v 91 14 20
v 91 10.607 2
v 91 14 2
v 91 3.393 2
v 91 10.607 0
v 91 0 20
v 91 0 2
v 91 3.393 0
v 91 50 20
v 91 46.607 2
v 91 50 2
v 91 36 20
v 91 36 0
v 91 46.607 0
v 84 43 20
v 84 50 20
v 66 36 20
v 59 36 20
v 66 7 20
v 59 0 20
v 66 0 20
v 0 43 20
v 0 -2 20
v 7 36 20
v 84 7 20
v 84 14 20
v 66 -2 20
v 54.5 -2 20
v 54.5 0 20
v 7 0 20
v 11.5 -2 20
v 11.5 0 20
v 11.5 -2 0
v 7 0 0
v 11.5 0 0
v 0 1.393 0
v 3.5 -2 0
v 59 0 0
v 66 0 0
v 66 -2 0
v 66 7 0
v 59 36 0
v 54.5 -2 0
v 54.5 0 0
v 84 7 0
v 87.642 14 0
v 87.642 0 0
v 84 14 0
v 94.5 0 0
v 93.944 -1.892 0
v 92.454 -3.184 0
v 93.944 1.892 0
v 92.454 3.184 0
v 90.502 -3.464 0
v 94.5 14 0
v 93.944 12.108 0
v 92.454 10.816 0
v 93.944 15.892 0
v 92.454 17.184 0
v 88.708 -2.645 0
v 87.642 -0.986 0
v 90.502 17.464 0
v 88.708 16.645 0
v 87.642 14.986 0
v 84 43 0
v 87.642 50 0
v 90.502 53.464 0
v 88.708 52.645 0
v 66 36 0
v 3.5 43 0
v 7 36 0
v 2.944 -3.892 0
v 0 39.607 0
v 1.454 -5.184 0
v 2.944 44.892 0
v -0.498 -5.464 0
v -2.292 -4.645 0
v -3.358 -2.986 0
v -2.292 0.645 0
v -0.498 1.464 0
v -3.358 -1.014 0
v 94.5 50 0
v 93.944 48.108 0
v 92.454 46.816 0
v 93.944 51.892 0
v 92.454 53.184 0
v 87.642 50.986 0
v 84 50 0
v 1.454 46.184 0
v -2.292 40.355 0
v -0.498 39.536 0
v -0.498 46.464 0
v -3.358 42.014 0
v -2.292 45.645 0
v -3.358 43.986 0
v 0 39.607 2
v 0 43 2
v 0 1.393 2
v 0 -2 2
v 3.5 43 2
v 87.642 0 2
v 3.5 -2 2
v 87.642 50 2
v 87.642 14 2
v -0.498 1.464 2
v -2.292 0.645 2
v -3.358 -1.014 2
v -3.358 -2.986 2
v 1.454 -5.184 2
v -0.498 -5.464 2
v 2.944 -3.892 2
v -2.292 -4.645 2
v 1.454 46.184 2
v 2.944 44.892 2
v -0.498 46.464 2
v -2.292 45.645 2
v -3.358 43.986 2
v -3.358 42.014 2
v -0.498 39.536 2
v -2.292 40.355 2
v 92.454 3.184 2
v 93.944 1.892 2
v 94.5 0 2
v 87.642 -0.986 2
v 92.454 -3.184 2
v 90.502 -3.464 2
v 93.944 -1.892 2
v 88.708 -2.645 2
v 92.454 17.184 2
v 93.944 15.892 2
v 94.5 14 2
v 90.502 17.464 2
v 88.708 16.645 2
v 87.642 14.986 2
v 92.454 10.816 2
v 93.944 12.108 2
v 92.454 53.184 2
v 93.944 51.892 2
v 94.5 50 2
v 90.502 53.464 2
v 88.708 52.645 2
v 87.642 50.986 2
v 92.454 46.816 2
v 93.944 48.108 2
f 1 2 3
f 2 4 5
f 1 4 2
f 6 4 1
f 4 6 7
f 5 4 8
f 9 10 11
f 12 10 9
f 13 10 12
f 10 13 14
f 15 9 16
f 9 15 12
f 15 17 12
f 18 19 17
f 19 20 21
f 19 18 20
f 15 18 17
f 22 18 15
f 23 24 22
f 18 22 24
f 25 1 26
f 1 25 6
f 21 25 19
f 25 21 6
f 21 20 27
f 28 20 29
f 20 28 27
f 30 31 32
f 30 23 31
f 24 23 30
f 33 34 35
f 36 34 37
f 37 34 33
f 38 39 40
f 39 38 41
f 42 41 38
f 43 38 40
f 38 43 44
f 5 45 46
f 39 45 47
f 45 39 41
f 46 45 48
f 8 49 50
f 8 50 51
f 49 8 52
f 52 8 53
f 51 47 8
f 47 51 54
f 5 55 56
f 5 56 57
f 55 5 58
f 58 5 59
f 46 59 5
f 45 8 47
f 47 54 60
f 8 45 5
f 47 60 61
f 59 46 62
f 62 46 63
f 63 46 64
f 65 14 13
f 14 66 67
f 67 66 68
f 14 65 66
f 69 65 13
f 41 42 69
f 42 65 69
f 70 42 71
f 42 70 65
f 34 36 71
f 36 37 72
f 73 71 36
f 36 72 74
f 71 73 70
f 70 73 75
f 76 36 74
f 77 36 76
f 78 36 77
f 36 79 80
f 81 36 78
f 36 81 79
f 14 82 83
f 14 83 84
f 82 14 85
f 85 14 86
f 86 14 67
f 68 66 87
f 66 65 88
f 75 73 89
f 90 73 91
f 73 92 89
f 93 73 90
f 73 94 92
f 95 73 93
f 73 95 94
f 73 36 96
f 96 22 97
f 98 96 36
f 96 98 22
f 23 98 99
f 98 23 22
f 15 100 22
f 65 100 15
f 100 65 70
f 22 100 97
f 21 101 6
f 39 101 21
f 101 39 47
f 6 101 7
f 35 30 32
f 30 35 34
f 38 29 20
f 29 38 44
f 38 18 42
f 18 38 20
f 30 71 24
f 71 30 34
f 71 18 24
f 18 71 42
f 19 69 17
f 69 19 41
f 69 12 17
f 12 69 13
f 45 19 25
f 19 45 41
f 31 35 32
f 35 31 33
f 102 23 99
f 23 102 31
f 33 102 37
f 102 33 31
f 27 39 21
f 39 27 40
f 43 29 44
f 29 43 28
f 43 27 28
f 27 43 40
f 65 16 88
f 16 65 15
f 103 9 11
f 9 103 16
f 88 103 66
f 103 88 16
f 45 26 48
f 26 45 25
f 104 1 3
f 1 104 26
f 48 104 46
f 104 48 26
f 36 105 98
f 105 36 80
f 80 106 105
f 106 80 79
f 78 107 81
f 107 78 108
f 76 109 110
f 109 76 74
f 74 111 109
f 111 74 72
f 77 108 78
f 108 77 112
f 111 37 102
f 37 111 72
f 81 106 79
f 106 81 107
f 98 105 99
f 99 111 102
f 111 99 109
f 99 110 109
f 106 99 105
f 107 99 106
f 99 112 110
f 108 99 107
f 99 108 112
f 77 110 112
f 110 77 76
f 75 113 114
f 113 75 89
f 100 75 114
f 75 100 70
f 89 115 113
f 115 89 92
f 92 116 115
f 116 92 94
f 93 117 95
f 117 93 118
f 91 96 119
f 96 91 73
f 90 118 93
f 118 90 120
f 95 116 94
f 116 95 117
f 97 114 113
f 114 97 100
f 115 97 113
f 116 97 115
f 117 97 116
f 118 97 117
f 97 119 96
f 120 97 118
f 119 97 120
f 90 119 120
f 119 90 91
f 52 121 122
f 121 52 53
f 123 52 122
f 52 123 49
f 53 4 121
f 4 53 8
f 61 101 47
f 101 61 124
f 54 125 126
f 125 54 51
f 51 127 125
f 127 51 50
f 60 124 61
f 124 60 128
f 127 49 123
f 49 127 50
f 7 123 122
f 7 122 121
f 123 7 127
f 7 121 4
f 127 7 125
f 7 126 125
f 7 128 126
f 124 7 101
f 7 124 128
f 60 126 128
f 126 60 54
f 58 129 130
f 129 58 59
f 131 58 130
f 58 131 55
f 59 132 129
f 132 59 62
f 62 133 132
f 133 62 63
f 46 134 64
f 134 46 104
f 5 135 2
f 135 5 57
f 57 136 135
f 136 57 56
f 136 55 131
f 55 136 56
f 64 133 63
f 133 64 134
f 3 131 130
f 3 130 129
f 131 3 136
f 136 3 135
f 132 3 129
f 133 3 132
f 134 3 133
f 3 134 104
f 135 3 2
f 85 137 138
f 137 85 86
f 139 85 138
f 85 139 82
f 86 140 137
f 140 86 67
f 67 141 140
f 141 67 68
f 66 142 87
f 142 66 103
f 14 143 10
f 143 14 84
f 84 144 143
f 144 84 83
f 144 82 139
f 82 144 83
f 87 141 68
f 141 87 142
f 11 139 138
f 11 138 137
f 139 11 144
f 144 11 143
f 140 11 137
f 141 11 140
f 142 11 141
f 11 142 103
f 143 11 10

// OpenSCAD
//
//  CubicalCoatHanger2
//
//  EvilTeach
//
//  1/15/2015
//
//  This is a replacment of the previous version
//  which is just fine in most cases.  When I added
//  my wintercoat to the mix of hat and jacket, it collapsed.
//  This model is a bit thicker and wider, and printed denser
//  so as to have a longer life.
//

//
//  55 minutes
//  5.8 meters
//  infill 15%
//  .2 layer
//  no shells
//  speed 60/75

// (RED) In effect this is the width of the piece.  For a lighter load this value can be reduced.
modelHeight    = 20.0;

// (RED) This is the thickness of the beam like parts.  With a lighter load this value can be reduced.
modelThickness =  7.0;

// (BLUE) distance across the metal cap on top of the cube partition
capWidth = 52.0;

// (BLUE) the height of the metal cap.
capDepth = 36.0;

// (RED) This is how far out the hook reaches from the cap
hookWidth = 25.0;

// (YELLOW) This is the size of the cube that the coat hooks on to.
hookDepth = modelThickness;

modelDepth = capDepth + modelThickness;
modelWidth = modelThickness + capWidth + modelThickness + hookWidth;

// (LIME) The length of the feet that grip under the cap
footDepth = 2.0;

// (CYAN) dimensions of the mouse ears
mouseEarRadius = 3.5;
mouseEarHeight = 2.0;

module mouse_ear()
{
    cylinder(r = mouseEarRadius, h = mouseEarHeight);
}



module cap()
{
    color("blue")
    {
        translate([modelThickness, 0, 0])
        cube([capWidth, capDepth, modelHeight]);
    }
}



module hook_arm()
{
    hookDepth = capDepth - modelThickness;
    translate([modelThickness + capWidth + modelThickness, modelThickness, 0])
        cube([hookWidth, hookDepth, modelHeight]);
}



module hooks()
{
    color("yellow")
    {
        translate([modelThickness + capWidth + modelThickness + hookWidth - modelThickness, 
                   capDepth + modelThickness, 
                   0])
            cube([modelThickness, modelThickness, modelHeight]);
        
        translate([modelThickness + capWidth + modelThickness + hookWidth - modelThickness, 
                   modelThickness, 
                   0])
            cube([modelThickness, hookDepth, modelHeight]);
    }
}

module base_cube()
{
    color("red")
        cube([modelWidth, modelDepth, modelHeight]);
}



module feet()
{
    color("lime")
    {
        footWidth = modelThickness + 4.5;
        footHeight = modelHeight;
        
        translate([0, -footDepth, 0])
            cube([footWidth, footDepth, footHeight]);

        translate([modelThickness + capWidth + modelThickness - footWidth, -footDepth, 0])
            cube([footWidth, footDepth, footHeight]);
    }
}



module mouse_ears()
{
    color("cyan")
    translate([0, -footDepth, 0])
        mouse_ear();

    color("cyan")
    translate([0, capDepth + modelThickness, 0])
        mouse_ear();
    
    color("cyan")
    translate([modelThickness + capWidth + modelThickness + hookWidth, 0, 0])
        mouse_ear();    

    color("cyan")
    translate([modelThickness + capWidth + modelThickness + hookWidth, modelThickness + hookDepth, 0])
        mouse_ear();

    color("cyan")
    translate([modelThickness + capWidth + modelThickness + hookWidth, capDepth + modelThickness + hookDepth, 0])
        mouse_ear();    

    
}



module main()
{
    difference()
    {
        base_cube();
        cap();
        hook_arm();
    }
    feet();
    hooks();
    
    mouse_ears();
}

main();
